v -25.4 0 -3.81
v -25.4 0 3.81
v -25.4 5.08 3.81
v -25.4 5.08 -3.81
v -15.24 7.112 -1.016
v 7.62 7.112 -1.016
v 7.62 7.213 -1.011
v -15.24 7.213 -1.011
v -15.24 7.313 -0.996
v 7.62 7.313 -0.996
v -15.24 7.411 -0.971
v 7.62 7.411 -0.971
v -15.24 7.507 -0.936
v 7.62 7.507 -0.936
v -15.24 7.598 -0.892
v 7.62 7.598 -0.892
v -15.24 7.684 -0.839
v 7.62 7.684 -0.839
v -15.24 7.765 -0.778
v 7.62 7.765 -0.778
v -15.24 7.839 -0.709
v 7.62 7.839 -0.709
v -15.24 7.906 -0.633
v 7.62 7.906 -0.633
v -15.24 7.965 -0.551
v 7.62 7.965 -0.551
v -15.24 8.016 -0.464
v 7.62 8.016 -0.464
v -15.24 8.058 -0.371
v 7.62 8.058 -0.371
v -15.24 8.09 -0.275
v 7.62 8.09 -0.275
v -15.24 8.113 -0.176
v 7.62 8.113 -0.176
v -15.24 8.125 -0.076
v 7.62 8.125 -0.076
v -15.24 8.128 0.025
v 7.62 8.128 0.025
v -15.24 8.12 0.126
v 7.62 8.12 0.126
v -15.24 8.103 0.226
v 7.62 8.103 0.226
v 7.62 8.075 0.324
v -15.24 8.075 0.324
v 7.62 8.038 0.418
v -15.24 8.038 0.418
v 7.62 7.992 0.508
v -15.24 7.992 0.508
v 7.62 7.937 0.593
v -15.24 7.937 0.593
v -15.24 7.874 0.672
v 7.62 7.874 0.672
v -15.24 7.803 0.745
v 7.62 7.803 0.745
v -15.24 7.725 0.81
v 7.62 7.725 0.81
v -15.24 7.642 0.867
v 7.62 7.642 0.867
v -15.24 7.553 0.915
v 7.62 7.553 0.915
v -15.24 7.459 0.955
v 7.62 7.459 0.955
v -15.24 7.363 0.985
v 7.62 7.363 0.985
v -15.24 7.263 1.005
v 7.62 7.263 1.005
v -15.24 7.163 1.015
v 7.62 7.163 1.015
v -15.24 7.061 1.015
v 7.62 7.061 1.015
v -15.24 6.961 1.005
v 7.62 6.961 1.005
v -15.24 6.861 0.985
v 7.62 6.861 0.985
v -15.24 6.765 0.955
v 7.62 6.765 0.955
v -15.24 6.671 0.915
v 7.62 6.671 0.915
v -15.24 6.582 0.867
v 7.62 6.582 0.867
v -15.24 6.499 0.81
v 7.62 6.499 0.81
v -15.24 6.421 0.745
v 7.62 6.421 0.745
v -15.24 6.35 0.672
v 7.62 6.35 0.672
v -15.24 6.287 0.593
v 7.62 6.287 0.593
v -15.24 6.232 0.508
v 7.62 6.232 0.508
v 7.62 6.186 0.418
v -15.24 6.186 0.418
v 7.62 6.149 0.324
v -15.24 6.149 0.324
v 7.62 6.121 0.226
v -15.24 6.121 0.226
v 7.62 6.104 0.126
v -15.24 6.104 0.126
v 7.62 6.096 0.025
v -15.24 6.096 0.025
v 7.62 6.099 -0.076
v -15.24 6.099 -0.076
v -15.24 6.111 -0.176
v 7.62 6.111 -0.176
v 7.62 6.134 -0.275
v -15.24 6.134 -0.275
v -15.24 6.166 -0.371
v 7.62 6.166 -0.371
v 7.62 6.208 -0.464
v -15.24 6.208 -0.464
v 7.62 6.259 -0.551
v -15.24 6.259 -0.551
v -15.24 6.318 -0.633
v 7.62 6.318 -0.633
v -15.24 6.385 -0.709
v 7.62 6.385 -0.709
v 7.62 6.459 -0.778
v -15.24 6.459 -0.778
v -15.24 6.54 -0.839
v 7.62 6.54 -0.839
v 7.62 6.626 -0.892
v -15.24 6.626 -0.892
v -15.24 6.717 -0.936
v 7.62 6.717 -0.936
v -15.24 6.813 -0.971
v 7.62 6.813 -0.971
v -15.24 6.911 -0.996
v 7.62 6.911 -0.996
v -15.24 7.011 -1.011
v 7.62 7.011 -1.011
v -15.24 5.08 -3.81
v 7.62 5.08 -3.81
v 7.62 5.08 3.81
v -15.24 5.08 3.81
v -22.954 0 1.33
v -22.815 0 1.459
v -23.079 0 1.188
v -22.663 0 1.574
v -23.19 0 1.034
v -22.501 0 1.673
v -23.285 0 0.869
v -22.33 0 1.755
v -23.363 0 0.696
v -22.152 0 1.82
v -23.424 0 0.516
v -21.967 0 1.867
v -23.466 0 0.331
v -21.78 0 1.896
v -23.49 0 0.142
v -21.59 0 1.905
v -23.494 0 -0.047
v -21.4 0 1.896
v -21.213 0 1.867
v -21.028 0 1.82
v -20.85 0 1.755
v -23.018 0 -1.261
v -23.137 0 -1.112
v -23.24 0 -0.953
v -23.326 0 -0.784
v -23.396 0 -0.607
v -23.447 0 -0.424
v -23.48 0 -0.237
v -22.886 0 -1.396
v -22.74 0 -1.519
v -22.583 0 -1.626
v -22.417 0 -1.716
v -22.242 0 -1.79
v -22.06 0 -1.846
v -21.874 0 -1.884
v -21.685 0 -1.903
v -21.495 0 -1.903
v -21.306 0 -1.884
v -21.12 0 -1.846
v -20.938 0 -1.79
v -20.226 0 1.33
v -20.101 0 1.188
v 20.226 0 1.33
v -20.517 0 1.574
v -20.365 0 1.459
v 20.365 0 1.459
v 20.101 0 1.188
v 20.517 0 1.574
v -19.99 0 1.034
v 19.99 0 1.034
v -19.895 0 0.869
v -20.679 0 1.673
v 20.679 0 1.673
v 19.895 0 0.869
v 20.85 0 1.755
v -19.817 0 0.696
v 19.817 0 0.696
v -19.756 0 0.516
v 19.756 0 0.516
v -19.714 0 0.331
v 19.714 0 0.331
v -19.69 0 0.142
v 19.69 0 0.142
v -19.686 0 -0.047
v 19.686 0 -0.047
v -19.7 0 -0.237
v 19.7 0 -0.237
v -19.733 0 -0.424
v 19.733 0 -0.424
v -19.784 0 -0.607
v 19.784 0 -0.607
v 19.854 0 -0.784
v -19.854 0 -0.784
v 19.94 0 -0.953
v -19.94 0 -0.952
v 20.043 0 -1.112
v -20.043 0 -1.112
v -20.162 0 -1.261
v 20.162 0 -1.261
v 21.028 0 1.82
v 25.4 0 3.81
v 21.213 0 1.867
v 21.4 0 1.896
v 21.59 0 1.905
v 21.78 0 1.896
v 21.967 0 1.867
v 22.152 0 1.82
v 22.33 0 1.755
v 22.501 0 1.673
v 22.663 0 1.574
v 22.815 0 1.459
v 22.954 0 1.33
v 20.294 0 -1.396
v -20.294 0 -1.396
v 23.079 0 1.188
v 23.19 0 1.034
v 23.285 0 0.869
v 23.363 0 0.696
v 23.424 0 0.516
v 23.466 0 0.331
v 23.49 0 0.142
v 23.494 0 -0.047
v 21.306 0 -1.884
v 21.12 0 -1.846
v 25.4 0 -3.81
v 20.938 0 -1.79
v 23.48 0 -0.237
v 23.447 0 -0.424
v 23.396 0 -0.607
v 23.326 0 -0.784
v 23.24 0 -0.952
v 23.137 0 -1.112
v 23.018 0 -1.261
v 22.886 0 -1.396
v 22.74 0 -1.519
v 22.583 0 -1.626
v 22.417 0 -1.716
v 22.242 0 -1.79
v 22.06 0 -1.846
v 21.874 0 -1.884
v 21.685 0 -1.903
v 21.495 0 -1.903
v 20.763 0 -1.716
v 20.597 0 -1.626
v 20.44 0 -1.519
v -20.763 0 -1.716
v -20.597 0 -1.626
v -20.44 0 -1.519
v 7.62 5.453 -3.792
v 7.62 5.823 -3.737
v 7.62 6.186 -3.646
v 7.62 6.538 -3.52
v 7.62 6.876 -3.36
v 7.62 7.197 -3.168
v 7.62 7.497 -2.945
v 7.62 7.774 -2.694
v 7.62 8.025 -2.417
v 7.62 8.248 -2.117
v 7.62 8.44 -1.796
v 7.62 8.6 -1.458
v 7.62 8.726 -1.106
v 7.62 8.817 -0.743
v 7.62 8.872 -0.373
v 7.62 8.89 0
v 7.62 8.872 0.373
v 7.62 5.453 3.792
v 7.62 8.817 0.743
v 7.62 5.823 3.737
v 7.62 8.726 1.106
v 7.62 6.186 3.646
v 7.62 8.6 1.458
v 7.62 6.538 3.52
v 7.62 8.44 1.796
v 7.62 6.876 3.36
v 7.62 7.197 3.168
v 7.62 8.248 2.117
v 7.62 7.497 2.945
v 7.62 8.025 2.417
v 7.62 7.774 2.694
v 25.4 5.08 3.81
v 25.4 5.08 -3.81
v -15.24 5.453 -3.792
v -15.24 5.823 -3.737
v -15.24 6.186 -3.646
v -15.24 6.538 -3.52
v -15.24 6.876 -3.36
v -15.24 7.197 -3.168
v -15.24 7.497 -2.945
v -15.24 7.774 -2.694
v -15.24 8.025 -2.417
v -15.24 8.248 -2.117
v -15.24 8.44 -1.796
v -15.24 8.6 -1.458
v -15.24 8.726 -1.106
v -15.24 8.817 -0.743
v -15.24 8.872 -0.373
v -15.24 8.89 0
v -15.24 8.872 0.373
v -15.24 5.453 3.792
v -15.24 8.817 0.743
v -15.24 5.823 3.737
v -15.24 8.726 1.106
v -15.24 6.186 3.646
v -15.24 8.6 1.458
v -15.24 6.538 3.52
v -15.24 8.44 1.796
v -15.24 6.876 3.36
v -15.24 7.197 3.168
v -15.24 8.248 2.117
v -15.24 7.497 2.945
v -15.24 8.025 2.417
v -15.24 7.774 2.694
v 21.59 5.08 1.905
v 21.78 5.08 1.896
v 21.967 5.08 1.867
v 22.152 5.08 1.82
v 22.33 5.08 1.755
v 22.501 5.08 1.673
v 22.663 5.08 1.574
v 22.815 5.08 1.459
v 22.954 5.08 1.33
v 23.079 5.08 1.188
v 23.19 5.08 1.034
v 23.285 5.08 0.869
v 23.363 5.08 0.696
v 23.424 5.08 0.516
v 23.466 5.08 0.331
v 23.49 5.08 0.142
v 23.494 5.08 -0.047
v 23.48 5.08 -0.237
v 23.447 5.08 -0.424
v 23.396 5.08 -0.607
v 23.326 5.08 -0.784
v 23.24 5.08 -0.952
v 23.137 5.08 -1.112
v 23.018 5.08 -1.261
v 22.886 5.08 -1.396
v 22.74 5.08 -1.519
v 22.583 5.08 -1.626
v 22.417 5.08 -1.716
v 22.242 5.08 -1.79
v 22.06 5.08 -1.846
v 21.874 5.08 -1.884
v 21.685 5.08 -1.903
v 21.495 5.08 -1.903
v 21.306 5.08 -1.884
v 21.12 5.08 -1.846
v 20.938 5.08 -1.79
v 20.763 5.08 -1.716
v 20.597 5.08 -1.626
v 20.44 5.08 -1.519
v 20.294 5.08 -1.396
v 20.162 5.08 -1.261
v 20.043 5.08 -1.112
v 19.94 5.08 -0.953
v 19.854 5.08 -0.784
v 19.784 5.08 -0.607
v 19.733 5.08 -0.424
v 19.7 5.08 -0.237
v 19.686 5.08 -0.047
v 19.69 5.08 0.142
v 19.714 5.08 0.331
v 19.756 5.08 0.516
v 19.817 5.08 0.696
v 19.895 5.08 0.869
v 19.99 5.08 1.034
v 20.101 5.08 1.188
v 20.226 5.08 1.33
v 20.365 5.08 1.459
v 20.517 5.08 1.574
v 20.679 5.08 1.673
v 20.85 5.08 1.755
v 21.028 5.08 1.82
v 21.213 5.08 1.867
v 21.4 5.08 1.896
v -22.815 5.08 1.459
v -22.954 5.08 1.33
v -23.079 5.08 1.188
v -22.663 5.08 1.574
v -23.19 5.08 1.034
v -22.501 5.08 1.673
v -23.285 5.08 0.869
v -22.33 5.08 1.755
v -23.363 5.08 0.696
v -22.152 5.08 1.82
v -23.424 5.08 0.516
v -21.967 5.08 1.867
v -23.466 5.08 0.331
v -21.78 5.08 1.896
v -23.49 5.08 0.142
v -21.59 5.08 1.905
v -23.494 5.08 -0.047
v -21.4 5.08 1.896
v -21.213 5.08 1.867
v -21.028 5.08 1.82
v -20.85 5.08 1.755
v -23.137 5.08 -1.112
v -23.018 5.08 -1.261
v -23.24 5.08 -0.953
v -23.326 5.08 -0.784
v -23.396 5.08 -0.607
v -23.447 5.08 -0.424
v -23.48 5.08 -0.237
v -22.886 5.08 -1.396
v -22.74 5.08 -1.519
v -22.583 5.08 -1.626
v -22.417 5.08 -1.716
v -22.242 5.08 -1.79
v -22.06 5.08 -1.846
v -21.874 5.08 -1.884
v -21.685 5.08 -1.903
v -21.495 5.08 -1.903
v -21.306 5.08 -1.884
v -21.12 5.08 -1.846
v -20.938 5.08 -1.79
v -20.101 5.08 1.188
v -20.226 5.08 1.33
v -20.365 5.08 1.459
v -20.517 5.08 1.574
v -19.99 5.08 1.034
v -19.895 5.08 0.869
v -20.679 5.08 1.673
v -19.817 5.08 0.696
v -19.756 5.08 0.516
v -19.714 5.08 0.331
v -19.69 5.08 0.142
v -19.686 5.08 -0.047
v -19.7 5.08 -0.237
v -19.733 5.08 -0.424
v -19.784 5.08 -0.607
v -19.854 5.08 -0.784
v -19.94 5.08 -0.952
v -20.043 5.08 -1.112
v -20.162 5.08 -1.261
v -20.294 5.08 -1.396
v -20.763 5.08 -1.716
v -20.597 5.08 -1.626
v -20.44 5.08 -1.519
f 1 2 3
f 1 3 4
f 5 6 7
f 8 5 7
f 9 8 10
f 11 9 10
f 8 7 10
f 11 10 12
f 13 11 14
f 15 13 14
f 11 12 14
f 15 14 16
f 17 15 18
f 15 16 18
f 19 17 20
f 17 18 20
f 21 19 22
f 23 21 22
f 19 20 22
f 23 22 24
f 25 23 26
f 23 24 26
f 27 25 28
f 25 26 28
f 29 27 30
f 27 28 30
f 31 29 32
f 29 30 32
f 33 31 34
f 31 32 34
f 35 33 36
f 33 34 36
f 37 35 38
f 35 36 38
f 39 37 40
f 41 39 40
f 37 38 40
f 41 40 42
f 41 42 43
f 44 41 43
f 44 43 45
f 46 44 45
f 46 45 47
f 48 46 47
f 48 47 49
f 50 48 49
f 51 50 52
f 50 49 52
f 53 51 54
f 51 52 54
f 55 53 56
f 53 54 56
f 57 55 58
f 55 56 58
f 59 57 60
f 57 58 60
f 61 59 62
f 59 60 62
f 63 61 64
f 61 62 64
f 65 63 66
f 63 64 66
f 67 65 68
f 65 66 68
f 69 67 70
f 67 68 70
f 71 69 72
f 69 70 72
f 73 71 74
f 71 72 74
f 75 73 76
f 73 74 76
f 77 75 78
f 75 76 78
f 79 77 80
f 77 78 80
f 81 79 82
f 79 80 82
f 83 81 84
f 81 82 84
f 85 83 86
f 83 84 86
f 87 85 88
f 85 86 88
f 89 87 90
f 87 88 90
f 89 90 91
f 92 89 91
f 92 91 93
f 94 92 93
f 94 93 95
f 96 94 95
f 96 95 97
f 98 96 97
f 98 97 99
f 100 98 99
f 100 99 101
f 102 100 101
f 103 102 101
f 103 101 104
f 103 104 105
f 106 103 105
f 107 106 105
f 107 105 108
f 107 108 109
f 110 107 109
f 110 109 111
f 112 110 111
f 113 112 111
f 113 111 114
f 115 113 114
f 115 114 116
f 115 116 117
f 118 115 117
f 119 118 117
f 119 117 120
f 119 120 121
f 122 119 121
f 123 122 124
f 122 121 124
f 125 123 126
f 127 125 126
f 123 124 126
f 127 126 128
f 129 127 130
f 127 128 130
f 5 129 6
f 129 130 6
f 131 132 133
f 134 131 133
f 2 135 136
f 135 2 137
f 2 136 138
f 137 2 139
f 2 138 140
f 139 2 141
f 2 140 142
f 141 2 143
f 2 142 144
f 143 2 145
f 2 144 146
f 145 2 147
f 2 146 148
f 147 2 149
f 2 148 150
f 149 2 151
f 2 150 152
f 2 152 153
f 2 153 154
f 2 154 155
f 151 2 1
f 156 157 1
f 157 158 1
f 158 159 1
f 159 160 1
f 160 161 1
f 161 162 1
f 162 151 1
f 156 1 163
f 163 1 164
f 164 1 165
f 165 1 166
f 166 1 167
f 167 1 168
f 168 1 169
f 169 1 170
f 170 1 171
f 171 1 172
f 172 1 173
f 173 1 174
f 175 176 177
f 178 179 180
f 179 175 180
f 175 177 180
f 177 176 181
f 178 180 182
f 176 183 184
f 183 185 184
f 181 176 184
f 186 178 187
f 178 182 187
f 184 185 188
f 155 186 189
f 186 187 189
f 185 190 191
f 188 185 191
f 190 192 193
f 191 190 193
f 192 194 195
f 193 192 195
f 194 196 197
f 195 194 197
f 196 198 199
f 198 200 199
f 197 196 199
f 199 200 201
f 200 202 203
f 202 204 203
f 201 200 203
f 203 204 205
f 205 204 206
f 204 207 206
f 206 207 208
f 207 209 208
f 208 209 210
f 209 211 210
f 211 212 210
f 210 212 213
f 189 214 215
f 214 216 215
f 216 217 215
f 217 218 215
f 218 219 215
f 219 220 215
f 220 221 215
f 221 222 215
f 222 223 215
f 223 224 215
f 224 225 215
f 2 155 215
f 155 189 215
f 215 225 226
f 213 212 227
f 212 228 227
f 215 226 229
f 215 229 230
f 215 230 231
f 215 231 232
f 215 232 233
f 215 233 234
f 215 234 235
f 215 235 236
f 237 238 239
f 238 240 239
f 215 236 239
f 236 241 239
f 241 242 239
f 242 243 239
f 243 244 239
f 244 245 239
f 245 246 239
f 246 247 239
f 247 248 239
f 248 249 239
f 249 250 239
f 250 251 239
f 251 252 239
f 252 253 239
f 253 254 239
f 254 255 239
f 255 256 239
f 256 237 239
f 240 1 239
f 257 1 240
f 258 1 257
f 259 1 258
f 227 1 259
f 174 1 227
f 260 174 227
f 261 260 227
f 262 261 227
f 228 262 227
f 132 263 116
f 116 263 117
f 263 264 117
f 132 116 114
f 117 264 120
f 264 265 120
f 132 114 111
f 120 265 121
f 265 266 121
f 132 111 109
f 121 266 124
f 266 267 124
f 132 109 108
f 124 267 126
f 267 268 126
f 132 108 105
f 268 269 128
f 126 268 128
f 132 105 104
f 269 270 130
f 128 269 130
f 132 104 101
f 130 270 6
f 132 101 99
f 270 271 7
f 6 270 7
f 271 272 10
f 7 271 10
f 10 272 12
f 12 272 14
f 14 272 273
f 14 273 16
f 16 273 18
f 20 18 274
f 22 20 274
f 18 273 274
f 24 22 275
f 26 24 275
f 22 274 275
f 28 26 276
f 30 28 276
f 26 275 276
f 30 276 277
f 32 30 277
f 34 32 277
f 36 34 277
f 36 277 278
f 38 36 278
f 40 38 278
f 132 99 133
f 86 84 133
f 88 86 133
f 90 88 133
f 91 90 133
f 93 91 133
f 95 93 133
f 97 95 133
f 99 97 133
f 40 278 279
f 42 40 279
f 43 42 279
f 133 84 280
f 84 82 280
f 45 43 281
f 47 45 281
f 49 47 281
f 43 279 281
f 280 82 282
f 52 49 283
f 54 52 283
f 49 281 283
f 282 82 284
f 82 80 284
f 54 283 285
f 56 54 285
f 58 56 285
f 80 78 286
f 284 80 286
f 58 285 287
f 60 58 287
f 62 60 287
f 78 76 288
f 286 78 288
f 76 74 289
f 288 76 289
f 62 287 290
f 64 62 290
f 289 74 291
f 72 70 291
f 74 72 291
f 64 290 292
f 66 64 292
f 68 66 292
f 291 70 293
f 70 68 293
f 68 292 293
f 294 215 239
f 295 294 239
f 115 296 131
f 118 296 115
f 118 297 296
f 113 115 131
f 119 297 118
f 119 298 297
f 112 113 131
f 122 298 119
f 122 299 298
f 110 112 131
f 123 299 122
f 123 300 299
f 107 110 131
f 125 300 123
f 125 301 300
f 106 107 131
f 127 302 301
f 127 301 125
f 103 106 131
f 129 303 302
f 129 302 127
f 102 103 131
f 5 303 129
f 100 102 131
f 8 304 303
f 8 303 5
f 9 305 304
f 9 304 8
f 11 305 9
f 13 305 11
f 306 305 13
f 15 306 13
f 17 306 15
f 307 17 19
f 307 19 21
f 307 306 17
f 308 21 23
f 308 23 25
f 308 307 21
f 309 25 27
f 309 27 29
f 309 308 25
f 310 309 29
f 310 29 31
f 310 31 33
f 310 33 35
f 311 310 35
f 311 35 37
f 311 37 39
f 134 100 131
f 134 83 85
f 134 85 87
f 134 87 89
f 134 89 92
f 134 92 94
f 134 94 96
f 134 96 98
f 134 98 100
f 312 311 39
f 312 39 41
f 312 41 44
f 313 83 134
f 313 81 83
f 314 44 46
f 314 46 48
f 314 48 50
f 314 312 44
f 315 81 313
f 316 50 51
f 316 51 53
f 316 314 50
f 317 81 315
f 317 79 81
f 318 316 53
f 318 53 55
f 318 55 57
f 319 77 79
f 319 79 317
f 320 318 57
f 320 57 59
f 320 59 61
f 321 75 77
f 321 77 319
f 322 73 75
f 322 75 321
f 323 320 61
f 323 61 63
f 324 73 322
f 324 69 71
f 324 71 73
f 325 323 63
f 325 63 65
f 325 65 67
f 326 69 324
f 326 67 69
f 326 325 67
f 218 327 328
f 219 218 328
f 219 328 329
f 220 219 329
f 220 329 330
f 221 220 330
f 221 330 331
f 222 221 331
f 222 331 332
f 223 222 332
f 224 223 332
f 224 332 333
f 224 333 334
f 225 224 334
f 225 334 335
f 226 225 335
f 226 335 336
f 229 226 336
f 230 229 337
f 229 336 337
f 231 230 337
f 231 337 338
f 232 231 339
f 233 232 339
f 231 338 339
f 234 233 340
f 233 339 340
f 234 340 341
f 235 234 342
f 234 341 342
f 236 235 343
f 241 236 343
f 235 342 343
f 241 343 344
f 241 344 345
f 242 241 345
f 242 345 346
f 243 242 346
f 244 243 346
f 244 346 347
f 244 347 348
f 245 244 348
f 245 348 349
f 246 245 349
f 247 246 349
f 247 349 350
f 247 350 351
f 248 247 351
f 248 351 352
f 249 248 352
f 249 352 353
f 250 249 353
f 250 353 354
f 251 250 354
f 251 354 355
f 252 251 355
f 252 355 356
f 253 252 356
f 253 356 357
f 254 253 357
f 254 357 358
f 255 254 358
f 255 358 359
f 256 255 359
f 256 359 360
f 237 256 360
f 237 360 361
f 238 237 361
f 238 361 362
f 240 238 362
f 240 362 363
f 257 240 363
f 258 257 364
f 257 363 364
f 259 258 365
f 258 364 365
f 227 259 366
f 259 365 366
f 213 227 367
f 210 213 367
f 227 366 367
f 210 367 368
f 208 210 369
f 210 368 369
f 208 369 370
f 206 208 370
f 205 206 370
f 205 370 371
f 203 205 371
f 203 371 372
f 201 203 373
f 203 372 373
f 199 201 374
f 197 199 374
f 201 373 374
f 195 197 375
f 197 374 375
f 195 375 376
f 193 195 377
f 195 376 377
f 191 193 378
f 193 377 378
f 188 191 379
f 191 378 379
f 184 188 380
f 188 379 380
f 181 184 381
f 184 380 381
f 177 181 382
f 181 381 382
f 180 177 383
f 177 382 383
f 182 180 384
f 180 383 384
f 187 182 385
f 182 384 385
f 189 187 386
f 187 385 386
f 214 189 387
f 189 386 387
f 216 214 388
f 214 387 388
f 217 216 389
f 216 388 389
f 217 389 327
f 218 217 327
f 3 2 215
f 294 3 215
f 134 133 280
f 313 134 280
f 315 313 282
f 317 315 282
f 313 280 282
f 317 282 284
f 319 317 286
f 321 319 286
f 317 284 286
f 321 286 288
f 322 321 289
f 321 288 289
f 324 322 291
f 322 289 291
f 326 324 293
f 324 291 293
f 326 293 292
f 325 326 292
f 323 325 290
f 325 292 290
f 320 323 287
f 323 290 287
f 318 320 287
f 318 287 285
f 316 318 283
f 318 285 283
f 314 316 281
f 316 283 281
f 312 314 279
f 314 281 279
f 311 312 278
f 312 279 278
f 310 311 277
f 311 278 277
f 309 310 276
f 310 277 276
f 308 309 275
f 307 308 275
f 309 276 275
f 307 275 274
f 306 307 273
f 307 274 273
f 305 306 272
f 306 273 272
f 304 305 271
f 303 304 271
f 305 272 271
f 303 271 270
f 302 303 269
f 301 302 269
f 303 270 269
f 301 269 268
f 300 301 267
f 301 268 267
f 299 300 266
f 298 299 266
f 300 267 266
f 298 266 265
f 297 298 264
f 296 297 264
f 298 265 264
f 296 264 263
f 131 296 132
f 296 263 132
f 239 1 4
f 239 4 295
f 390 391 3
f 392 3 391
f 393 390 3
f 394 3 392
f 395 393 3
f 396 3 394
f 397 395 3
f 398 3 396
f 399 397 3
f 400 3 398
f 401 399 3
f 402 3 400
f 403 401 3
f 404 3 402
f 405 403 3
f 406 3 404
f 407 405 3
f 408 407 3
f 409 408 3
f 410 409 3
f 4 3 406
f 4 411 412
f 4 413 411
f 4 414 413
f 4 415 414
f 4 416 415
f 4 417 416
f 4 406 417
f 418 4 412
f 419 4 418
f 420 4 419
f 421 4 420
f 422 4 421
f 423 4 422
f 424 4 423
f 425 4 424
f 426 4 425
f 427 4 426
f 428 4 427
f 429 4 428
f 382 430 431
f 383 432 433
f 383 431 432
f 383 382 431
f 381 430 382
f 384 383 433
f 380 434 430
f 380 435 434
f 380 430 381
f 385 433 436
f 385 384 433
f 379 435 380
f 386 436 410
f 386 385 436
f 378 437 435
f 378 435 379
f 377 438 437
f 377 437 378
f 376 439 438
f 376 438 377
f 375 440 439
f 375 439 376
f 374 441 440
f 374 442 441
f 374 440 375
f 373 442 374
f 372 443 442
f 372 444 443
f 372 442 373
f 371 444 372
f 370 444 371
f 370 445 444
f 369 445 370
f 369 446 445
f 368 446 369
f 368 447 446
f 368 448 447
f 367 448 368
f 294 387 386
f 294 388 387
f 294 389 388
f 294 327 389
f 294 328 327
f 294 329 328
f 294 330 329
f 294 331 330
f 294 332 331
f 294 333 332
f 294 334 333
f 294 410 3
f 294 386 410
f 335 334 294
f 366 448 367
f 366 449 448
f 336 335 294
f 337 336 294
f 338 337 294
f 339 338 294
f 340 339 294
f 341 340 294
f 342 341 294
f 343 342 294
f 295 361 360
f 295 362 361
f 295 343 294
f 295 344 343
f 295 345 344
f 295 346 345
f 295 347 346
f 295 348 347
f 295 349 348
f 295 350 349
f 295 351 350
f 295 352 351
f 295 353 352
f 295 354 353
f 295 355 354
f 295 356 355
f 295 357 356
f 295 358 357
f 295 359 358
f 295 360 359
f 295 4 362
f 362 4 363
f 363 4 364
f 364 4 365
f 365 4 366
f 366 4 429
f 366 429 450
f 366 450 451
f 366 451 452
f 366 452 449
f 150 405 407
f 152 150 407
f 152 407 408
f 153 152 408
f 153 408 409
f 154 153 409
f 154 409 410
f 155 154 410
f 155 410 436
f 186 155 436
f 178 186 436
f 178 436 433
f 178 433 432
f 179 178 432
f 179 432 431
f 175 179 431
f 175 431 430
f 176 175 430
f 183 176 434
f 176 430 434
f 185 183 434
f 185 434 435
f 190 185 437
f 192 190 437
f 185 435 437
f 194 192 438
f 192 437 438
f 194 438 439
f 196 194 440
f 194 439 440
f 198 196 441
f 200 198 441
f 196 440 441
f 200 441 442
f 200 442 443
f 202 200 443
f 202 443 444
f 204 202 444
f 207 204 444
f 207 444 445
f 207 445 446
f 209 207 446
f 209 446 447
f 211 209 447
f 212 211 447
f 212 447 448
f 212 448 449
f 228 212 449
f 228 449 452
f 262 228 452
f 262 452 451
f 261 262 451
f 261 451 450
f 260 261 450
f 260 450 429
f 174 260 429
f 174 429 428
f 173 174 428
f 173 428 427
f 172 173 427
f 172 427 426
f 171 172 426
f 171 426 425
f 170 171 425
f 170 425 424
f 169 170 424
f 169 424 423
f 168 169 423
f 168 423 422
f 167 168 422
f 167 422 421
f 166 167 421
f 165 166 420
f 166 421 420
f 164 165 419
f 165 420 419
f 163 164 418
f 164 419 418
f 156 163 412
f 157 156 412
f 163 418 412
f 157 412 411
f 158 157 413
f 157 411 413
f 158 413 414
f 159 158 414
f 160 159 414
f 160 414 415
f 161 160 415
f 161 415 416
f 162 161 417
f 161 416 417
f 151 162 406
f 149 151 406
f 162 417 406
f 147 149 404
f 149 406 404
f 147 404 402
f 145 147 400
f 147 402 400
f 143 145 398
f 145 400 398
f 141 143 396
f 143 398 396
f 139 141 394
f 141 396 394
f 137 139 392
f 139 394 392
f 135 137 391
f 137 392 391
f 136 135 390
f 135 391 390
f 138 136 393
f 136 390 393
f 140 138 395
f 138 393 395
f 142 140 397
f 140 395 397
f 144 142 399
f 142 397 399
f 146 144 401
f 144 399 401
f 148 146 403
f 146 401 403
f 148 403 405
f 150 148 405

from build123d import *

# Parameters (mm, degrees)
SKETCH1_W           = 50.8
SKETCH1_H           = 7.62
BOSS_EXTRUDE1_DEPTH = 5.08
BOSS_EXTRUDE2_START = -17.78
SKETCH2_R           = 1.016
BOSS_EXTRUDE2_DEPTH = 22.86
SKETCH3_R           = 1.905
CUT_EXTRUDE1_DEPTH  = 27.181720723


with BuildPart() as part:
    # Sketch1 → Boss-Extrude1 (new body)
    with BuildSketch(Plane(origin=(0, 0, 0), x_dir=(1, 0, 0), z_dir=(0, 1, 0))):
        Rectangle(SKETCH1_W, SKETCH1_H)
    extrude(amount=BOSS_EXTRUDE1_DEPTH)

    # Sketch3 → Cut-Extrude1 (cut, through all)
    with BuildSketch(Plane(origin=(0, 5.08, 0), x_dir=(1, 0, 0), z_dir=(0, 1, 0))):
        with Locations(Location((-21.59, 0, 0), (0, 0, 270))):
            Circle(SKETCH3_R)
        with Locations(Location((21.59, 0, 0), (0, 0, 270))):
            Circle(SKETCH3_R)
    extrude(amount=-CUT_EXTRUDE1_DEPTH, mode=Mode.SUBTRACT)


with BuildPart() as body_2:
    # Sketch2 → Boss-Extrude2 (new body)
    with BuildSketch(Plane(origin=(25.4, 0, 0), x_dir=(0, 0, -1), z_dir=(1, 0, 0)).offset(BOSS_EXTRUDE2_START)):
        with BuildLine():
            Line((3.81, 5.08), (-3.81, 5.08))
            ThreePointArc((-3.81, 5.08), (0, 8.89), (3.81, 5.08))
        make_face()
        with Locations((0, 7.112)):
            Circle(SKETCH2_R, mode=Mode.SUBTRACT)
    extrude(amount=-BOSS_EXTRUDE2_DEPTH)


solid = Compound([part.part, body_2.part])
